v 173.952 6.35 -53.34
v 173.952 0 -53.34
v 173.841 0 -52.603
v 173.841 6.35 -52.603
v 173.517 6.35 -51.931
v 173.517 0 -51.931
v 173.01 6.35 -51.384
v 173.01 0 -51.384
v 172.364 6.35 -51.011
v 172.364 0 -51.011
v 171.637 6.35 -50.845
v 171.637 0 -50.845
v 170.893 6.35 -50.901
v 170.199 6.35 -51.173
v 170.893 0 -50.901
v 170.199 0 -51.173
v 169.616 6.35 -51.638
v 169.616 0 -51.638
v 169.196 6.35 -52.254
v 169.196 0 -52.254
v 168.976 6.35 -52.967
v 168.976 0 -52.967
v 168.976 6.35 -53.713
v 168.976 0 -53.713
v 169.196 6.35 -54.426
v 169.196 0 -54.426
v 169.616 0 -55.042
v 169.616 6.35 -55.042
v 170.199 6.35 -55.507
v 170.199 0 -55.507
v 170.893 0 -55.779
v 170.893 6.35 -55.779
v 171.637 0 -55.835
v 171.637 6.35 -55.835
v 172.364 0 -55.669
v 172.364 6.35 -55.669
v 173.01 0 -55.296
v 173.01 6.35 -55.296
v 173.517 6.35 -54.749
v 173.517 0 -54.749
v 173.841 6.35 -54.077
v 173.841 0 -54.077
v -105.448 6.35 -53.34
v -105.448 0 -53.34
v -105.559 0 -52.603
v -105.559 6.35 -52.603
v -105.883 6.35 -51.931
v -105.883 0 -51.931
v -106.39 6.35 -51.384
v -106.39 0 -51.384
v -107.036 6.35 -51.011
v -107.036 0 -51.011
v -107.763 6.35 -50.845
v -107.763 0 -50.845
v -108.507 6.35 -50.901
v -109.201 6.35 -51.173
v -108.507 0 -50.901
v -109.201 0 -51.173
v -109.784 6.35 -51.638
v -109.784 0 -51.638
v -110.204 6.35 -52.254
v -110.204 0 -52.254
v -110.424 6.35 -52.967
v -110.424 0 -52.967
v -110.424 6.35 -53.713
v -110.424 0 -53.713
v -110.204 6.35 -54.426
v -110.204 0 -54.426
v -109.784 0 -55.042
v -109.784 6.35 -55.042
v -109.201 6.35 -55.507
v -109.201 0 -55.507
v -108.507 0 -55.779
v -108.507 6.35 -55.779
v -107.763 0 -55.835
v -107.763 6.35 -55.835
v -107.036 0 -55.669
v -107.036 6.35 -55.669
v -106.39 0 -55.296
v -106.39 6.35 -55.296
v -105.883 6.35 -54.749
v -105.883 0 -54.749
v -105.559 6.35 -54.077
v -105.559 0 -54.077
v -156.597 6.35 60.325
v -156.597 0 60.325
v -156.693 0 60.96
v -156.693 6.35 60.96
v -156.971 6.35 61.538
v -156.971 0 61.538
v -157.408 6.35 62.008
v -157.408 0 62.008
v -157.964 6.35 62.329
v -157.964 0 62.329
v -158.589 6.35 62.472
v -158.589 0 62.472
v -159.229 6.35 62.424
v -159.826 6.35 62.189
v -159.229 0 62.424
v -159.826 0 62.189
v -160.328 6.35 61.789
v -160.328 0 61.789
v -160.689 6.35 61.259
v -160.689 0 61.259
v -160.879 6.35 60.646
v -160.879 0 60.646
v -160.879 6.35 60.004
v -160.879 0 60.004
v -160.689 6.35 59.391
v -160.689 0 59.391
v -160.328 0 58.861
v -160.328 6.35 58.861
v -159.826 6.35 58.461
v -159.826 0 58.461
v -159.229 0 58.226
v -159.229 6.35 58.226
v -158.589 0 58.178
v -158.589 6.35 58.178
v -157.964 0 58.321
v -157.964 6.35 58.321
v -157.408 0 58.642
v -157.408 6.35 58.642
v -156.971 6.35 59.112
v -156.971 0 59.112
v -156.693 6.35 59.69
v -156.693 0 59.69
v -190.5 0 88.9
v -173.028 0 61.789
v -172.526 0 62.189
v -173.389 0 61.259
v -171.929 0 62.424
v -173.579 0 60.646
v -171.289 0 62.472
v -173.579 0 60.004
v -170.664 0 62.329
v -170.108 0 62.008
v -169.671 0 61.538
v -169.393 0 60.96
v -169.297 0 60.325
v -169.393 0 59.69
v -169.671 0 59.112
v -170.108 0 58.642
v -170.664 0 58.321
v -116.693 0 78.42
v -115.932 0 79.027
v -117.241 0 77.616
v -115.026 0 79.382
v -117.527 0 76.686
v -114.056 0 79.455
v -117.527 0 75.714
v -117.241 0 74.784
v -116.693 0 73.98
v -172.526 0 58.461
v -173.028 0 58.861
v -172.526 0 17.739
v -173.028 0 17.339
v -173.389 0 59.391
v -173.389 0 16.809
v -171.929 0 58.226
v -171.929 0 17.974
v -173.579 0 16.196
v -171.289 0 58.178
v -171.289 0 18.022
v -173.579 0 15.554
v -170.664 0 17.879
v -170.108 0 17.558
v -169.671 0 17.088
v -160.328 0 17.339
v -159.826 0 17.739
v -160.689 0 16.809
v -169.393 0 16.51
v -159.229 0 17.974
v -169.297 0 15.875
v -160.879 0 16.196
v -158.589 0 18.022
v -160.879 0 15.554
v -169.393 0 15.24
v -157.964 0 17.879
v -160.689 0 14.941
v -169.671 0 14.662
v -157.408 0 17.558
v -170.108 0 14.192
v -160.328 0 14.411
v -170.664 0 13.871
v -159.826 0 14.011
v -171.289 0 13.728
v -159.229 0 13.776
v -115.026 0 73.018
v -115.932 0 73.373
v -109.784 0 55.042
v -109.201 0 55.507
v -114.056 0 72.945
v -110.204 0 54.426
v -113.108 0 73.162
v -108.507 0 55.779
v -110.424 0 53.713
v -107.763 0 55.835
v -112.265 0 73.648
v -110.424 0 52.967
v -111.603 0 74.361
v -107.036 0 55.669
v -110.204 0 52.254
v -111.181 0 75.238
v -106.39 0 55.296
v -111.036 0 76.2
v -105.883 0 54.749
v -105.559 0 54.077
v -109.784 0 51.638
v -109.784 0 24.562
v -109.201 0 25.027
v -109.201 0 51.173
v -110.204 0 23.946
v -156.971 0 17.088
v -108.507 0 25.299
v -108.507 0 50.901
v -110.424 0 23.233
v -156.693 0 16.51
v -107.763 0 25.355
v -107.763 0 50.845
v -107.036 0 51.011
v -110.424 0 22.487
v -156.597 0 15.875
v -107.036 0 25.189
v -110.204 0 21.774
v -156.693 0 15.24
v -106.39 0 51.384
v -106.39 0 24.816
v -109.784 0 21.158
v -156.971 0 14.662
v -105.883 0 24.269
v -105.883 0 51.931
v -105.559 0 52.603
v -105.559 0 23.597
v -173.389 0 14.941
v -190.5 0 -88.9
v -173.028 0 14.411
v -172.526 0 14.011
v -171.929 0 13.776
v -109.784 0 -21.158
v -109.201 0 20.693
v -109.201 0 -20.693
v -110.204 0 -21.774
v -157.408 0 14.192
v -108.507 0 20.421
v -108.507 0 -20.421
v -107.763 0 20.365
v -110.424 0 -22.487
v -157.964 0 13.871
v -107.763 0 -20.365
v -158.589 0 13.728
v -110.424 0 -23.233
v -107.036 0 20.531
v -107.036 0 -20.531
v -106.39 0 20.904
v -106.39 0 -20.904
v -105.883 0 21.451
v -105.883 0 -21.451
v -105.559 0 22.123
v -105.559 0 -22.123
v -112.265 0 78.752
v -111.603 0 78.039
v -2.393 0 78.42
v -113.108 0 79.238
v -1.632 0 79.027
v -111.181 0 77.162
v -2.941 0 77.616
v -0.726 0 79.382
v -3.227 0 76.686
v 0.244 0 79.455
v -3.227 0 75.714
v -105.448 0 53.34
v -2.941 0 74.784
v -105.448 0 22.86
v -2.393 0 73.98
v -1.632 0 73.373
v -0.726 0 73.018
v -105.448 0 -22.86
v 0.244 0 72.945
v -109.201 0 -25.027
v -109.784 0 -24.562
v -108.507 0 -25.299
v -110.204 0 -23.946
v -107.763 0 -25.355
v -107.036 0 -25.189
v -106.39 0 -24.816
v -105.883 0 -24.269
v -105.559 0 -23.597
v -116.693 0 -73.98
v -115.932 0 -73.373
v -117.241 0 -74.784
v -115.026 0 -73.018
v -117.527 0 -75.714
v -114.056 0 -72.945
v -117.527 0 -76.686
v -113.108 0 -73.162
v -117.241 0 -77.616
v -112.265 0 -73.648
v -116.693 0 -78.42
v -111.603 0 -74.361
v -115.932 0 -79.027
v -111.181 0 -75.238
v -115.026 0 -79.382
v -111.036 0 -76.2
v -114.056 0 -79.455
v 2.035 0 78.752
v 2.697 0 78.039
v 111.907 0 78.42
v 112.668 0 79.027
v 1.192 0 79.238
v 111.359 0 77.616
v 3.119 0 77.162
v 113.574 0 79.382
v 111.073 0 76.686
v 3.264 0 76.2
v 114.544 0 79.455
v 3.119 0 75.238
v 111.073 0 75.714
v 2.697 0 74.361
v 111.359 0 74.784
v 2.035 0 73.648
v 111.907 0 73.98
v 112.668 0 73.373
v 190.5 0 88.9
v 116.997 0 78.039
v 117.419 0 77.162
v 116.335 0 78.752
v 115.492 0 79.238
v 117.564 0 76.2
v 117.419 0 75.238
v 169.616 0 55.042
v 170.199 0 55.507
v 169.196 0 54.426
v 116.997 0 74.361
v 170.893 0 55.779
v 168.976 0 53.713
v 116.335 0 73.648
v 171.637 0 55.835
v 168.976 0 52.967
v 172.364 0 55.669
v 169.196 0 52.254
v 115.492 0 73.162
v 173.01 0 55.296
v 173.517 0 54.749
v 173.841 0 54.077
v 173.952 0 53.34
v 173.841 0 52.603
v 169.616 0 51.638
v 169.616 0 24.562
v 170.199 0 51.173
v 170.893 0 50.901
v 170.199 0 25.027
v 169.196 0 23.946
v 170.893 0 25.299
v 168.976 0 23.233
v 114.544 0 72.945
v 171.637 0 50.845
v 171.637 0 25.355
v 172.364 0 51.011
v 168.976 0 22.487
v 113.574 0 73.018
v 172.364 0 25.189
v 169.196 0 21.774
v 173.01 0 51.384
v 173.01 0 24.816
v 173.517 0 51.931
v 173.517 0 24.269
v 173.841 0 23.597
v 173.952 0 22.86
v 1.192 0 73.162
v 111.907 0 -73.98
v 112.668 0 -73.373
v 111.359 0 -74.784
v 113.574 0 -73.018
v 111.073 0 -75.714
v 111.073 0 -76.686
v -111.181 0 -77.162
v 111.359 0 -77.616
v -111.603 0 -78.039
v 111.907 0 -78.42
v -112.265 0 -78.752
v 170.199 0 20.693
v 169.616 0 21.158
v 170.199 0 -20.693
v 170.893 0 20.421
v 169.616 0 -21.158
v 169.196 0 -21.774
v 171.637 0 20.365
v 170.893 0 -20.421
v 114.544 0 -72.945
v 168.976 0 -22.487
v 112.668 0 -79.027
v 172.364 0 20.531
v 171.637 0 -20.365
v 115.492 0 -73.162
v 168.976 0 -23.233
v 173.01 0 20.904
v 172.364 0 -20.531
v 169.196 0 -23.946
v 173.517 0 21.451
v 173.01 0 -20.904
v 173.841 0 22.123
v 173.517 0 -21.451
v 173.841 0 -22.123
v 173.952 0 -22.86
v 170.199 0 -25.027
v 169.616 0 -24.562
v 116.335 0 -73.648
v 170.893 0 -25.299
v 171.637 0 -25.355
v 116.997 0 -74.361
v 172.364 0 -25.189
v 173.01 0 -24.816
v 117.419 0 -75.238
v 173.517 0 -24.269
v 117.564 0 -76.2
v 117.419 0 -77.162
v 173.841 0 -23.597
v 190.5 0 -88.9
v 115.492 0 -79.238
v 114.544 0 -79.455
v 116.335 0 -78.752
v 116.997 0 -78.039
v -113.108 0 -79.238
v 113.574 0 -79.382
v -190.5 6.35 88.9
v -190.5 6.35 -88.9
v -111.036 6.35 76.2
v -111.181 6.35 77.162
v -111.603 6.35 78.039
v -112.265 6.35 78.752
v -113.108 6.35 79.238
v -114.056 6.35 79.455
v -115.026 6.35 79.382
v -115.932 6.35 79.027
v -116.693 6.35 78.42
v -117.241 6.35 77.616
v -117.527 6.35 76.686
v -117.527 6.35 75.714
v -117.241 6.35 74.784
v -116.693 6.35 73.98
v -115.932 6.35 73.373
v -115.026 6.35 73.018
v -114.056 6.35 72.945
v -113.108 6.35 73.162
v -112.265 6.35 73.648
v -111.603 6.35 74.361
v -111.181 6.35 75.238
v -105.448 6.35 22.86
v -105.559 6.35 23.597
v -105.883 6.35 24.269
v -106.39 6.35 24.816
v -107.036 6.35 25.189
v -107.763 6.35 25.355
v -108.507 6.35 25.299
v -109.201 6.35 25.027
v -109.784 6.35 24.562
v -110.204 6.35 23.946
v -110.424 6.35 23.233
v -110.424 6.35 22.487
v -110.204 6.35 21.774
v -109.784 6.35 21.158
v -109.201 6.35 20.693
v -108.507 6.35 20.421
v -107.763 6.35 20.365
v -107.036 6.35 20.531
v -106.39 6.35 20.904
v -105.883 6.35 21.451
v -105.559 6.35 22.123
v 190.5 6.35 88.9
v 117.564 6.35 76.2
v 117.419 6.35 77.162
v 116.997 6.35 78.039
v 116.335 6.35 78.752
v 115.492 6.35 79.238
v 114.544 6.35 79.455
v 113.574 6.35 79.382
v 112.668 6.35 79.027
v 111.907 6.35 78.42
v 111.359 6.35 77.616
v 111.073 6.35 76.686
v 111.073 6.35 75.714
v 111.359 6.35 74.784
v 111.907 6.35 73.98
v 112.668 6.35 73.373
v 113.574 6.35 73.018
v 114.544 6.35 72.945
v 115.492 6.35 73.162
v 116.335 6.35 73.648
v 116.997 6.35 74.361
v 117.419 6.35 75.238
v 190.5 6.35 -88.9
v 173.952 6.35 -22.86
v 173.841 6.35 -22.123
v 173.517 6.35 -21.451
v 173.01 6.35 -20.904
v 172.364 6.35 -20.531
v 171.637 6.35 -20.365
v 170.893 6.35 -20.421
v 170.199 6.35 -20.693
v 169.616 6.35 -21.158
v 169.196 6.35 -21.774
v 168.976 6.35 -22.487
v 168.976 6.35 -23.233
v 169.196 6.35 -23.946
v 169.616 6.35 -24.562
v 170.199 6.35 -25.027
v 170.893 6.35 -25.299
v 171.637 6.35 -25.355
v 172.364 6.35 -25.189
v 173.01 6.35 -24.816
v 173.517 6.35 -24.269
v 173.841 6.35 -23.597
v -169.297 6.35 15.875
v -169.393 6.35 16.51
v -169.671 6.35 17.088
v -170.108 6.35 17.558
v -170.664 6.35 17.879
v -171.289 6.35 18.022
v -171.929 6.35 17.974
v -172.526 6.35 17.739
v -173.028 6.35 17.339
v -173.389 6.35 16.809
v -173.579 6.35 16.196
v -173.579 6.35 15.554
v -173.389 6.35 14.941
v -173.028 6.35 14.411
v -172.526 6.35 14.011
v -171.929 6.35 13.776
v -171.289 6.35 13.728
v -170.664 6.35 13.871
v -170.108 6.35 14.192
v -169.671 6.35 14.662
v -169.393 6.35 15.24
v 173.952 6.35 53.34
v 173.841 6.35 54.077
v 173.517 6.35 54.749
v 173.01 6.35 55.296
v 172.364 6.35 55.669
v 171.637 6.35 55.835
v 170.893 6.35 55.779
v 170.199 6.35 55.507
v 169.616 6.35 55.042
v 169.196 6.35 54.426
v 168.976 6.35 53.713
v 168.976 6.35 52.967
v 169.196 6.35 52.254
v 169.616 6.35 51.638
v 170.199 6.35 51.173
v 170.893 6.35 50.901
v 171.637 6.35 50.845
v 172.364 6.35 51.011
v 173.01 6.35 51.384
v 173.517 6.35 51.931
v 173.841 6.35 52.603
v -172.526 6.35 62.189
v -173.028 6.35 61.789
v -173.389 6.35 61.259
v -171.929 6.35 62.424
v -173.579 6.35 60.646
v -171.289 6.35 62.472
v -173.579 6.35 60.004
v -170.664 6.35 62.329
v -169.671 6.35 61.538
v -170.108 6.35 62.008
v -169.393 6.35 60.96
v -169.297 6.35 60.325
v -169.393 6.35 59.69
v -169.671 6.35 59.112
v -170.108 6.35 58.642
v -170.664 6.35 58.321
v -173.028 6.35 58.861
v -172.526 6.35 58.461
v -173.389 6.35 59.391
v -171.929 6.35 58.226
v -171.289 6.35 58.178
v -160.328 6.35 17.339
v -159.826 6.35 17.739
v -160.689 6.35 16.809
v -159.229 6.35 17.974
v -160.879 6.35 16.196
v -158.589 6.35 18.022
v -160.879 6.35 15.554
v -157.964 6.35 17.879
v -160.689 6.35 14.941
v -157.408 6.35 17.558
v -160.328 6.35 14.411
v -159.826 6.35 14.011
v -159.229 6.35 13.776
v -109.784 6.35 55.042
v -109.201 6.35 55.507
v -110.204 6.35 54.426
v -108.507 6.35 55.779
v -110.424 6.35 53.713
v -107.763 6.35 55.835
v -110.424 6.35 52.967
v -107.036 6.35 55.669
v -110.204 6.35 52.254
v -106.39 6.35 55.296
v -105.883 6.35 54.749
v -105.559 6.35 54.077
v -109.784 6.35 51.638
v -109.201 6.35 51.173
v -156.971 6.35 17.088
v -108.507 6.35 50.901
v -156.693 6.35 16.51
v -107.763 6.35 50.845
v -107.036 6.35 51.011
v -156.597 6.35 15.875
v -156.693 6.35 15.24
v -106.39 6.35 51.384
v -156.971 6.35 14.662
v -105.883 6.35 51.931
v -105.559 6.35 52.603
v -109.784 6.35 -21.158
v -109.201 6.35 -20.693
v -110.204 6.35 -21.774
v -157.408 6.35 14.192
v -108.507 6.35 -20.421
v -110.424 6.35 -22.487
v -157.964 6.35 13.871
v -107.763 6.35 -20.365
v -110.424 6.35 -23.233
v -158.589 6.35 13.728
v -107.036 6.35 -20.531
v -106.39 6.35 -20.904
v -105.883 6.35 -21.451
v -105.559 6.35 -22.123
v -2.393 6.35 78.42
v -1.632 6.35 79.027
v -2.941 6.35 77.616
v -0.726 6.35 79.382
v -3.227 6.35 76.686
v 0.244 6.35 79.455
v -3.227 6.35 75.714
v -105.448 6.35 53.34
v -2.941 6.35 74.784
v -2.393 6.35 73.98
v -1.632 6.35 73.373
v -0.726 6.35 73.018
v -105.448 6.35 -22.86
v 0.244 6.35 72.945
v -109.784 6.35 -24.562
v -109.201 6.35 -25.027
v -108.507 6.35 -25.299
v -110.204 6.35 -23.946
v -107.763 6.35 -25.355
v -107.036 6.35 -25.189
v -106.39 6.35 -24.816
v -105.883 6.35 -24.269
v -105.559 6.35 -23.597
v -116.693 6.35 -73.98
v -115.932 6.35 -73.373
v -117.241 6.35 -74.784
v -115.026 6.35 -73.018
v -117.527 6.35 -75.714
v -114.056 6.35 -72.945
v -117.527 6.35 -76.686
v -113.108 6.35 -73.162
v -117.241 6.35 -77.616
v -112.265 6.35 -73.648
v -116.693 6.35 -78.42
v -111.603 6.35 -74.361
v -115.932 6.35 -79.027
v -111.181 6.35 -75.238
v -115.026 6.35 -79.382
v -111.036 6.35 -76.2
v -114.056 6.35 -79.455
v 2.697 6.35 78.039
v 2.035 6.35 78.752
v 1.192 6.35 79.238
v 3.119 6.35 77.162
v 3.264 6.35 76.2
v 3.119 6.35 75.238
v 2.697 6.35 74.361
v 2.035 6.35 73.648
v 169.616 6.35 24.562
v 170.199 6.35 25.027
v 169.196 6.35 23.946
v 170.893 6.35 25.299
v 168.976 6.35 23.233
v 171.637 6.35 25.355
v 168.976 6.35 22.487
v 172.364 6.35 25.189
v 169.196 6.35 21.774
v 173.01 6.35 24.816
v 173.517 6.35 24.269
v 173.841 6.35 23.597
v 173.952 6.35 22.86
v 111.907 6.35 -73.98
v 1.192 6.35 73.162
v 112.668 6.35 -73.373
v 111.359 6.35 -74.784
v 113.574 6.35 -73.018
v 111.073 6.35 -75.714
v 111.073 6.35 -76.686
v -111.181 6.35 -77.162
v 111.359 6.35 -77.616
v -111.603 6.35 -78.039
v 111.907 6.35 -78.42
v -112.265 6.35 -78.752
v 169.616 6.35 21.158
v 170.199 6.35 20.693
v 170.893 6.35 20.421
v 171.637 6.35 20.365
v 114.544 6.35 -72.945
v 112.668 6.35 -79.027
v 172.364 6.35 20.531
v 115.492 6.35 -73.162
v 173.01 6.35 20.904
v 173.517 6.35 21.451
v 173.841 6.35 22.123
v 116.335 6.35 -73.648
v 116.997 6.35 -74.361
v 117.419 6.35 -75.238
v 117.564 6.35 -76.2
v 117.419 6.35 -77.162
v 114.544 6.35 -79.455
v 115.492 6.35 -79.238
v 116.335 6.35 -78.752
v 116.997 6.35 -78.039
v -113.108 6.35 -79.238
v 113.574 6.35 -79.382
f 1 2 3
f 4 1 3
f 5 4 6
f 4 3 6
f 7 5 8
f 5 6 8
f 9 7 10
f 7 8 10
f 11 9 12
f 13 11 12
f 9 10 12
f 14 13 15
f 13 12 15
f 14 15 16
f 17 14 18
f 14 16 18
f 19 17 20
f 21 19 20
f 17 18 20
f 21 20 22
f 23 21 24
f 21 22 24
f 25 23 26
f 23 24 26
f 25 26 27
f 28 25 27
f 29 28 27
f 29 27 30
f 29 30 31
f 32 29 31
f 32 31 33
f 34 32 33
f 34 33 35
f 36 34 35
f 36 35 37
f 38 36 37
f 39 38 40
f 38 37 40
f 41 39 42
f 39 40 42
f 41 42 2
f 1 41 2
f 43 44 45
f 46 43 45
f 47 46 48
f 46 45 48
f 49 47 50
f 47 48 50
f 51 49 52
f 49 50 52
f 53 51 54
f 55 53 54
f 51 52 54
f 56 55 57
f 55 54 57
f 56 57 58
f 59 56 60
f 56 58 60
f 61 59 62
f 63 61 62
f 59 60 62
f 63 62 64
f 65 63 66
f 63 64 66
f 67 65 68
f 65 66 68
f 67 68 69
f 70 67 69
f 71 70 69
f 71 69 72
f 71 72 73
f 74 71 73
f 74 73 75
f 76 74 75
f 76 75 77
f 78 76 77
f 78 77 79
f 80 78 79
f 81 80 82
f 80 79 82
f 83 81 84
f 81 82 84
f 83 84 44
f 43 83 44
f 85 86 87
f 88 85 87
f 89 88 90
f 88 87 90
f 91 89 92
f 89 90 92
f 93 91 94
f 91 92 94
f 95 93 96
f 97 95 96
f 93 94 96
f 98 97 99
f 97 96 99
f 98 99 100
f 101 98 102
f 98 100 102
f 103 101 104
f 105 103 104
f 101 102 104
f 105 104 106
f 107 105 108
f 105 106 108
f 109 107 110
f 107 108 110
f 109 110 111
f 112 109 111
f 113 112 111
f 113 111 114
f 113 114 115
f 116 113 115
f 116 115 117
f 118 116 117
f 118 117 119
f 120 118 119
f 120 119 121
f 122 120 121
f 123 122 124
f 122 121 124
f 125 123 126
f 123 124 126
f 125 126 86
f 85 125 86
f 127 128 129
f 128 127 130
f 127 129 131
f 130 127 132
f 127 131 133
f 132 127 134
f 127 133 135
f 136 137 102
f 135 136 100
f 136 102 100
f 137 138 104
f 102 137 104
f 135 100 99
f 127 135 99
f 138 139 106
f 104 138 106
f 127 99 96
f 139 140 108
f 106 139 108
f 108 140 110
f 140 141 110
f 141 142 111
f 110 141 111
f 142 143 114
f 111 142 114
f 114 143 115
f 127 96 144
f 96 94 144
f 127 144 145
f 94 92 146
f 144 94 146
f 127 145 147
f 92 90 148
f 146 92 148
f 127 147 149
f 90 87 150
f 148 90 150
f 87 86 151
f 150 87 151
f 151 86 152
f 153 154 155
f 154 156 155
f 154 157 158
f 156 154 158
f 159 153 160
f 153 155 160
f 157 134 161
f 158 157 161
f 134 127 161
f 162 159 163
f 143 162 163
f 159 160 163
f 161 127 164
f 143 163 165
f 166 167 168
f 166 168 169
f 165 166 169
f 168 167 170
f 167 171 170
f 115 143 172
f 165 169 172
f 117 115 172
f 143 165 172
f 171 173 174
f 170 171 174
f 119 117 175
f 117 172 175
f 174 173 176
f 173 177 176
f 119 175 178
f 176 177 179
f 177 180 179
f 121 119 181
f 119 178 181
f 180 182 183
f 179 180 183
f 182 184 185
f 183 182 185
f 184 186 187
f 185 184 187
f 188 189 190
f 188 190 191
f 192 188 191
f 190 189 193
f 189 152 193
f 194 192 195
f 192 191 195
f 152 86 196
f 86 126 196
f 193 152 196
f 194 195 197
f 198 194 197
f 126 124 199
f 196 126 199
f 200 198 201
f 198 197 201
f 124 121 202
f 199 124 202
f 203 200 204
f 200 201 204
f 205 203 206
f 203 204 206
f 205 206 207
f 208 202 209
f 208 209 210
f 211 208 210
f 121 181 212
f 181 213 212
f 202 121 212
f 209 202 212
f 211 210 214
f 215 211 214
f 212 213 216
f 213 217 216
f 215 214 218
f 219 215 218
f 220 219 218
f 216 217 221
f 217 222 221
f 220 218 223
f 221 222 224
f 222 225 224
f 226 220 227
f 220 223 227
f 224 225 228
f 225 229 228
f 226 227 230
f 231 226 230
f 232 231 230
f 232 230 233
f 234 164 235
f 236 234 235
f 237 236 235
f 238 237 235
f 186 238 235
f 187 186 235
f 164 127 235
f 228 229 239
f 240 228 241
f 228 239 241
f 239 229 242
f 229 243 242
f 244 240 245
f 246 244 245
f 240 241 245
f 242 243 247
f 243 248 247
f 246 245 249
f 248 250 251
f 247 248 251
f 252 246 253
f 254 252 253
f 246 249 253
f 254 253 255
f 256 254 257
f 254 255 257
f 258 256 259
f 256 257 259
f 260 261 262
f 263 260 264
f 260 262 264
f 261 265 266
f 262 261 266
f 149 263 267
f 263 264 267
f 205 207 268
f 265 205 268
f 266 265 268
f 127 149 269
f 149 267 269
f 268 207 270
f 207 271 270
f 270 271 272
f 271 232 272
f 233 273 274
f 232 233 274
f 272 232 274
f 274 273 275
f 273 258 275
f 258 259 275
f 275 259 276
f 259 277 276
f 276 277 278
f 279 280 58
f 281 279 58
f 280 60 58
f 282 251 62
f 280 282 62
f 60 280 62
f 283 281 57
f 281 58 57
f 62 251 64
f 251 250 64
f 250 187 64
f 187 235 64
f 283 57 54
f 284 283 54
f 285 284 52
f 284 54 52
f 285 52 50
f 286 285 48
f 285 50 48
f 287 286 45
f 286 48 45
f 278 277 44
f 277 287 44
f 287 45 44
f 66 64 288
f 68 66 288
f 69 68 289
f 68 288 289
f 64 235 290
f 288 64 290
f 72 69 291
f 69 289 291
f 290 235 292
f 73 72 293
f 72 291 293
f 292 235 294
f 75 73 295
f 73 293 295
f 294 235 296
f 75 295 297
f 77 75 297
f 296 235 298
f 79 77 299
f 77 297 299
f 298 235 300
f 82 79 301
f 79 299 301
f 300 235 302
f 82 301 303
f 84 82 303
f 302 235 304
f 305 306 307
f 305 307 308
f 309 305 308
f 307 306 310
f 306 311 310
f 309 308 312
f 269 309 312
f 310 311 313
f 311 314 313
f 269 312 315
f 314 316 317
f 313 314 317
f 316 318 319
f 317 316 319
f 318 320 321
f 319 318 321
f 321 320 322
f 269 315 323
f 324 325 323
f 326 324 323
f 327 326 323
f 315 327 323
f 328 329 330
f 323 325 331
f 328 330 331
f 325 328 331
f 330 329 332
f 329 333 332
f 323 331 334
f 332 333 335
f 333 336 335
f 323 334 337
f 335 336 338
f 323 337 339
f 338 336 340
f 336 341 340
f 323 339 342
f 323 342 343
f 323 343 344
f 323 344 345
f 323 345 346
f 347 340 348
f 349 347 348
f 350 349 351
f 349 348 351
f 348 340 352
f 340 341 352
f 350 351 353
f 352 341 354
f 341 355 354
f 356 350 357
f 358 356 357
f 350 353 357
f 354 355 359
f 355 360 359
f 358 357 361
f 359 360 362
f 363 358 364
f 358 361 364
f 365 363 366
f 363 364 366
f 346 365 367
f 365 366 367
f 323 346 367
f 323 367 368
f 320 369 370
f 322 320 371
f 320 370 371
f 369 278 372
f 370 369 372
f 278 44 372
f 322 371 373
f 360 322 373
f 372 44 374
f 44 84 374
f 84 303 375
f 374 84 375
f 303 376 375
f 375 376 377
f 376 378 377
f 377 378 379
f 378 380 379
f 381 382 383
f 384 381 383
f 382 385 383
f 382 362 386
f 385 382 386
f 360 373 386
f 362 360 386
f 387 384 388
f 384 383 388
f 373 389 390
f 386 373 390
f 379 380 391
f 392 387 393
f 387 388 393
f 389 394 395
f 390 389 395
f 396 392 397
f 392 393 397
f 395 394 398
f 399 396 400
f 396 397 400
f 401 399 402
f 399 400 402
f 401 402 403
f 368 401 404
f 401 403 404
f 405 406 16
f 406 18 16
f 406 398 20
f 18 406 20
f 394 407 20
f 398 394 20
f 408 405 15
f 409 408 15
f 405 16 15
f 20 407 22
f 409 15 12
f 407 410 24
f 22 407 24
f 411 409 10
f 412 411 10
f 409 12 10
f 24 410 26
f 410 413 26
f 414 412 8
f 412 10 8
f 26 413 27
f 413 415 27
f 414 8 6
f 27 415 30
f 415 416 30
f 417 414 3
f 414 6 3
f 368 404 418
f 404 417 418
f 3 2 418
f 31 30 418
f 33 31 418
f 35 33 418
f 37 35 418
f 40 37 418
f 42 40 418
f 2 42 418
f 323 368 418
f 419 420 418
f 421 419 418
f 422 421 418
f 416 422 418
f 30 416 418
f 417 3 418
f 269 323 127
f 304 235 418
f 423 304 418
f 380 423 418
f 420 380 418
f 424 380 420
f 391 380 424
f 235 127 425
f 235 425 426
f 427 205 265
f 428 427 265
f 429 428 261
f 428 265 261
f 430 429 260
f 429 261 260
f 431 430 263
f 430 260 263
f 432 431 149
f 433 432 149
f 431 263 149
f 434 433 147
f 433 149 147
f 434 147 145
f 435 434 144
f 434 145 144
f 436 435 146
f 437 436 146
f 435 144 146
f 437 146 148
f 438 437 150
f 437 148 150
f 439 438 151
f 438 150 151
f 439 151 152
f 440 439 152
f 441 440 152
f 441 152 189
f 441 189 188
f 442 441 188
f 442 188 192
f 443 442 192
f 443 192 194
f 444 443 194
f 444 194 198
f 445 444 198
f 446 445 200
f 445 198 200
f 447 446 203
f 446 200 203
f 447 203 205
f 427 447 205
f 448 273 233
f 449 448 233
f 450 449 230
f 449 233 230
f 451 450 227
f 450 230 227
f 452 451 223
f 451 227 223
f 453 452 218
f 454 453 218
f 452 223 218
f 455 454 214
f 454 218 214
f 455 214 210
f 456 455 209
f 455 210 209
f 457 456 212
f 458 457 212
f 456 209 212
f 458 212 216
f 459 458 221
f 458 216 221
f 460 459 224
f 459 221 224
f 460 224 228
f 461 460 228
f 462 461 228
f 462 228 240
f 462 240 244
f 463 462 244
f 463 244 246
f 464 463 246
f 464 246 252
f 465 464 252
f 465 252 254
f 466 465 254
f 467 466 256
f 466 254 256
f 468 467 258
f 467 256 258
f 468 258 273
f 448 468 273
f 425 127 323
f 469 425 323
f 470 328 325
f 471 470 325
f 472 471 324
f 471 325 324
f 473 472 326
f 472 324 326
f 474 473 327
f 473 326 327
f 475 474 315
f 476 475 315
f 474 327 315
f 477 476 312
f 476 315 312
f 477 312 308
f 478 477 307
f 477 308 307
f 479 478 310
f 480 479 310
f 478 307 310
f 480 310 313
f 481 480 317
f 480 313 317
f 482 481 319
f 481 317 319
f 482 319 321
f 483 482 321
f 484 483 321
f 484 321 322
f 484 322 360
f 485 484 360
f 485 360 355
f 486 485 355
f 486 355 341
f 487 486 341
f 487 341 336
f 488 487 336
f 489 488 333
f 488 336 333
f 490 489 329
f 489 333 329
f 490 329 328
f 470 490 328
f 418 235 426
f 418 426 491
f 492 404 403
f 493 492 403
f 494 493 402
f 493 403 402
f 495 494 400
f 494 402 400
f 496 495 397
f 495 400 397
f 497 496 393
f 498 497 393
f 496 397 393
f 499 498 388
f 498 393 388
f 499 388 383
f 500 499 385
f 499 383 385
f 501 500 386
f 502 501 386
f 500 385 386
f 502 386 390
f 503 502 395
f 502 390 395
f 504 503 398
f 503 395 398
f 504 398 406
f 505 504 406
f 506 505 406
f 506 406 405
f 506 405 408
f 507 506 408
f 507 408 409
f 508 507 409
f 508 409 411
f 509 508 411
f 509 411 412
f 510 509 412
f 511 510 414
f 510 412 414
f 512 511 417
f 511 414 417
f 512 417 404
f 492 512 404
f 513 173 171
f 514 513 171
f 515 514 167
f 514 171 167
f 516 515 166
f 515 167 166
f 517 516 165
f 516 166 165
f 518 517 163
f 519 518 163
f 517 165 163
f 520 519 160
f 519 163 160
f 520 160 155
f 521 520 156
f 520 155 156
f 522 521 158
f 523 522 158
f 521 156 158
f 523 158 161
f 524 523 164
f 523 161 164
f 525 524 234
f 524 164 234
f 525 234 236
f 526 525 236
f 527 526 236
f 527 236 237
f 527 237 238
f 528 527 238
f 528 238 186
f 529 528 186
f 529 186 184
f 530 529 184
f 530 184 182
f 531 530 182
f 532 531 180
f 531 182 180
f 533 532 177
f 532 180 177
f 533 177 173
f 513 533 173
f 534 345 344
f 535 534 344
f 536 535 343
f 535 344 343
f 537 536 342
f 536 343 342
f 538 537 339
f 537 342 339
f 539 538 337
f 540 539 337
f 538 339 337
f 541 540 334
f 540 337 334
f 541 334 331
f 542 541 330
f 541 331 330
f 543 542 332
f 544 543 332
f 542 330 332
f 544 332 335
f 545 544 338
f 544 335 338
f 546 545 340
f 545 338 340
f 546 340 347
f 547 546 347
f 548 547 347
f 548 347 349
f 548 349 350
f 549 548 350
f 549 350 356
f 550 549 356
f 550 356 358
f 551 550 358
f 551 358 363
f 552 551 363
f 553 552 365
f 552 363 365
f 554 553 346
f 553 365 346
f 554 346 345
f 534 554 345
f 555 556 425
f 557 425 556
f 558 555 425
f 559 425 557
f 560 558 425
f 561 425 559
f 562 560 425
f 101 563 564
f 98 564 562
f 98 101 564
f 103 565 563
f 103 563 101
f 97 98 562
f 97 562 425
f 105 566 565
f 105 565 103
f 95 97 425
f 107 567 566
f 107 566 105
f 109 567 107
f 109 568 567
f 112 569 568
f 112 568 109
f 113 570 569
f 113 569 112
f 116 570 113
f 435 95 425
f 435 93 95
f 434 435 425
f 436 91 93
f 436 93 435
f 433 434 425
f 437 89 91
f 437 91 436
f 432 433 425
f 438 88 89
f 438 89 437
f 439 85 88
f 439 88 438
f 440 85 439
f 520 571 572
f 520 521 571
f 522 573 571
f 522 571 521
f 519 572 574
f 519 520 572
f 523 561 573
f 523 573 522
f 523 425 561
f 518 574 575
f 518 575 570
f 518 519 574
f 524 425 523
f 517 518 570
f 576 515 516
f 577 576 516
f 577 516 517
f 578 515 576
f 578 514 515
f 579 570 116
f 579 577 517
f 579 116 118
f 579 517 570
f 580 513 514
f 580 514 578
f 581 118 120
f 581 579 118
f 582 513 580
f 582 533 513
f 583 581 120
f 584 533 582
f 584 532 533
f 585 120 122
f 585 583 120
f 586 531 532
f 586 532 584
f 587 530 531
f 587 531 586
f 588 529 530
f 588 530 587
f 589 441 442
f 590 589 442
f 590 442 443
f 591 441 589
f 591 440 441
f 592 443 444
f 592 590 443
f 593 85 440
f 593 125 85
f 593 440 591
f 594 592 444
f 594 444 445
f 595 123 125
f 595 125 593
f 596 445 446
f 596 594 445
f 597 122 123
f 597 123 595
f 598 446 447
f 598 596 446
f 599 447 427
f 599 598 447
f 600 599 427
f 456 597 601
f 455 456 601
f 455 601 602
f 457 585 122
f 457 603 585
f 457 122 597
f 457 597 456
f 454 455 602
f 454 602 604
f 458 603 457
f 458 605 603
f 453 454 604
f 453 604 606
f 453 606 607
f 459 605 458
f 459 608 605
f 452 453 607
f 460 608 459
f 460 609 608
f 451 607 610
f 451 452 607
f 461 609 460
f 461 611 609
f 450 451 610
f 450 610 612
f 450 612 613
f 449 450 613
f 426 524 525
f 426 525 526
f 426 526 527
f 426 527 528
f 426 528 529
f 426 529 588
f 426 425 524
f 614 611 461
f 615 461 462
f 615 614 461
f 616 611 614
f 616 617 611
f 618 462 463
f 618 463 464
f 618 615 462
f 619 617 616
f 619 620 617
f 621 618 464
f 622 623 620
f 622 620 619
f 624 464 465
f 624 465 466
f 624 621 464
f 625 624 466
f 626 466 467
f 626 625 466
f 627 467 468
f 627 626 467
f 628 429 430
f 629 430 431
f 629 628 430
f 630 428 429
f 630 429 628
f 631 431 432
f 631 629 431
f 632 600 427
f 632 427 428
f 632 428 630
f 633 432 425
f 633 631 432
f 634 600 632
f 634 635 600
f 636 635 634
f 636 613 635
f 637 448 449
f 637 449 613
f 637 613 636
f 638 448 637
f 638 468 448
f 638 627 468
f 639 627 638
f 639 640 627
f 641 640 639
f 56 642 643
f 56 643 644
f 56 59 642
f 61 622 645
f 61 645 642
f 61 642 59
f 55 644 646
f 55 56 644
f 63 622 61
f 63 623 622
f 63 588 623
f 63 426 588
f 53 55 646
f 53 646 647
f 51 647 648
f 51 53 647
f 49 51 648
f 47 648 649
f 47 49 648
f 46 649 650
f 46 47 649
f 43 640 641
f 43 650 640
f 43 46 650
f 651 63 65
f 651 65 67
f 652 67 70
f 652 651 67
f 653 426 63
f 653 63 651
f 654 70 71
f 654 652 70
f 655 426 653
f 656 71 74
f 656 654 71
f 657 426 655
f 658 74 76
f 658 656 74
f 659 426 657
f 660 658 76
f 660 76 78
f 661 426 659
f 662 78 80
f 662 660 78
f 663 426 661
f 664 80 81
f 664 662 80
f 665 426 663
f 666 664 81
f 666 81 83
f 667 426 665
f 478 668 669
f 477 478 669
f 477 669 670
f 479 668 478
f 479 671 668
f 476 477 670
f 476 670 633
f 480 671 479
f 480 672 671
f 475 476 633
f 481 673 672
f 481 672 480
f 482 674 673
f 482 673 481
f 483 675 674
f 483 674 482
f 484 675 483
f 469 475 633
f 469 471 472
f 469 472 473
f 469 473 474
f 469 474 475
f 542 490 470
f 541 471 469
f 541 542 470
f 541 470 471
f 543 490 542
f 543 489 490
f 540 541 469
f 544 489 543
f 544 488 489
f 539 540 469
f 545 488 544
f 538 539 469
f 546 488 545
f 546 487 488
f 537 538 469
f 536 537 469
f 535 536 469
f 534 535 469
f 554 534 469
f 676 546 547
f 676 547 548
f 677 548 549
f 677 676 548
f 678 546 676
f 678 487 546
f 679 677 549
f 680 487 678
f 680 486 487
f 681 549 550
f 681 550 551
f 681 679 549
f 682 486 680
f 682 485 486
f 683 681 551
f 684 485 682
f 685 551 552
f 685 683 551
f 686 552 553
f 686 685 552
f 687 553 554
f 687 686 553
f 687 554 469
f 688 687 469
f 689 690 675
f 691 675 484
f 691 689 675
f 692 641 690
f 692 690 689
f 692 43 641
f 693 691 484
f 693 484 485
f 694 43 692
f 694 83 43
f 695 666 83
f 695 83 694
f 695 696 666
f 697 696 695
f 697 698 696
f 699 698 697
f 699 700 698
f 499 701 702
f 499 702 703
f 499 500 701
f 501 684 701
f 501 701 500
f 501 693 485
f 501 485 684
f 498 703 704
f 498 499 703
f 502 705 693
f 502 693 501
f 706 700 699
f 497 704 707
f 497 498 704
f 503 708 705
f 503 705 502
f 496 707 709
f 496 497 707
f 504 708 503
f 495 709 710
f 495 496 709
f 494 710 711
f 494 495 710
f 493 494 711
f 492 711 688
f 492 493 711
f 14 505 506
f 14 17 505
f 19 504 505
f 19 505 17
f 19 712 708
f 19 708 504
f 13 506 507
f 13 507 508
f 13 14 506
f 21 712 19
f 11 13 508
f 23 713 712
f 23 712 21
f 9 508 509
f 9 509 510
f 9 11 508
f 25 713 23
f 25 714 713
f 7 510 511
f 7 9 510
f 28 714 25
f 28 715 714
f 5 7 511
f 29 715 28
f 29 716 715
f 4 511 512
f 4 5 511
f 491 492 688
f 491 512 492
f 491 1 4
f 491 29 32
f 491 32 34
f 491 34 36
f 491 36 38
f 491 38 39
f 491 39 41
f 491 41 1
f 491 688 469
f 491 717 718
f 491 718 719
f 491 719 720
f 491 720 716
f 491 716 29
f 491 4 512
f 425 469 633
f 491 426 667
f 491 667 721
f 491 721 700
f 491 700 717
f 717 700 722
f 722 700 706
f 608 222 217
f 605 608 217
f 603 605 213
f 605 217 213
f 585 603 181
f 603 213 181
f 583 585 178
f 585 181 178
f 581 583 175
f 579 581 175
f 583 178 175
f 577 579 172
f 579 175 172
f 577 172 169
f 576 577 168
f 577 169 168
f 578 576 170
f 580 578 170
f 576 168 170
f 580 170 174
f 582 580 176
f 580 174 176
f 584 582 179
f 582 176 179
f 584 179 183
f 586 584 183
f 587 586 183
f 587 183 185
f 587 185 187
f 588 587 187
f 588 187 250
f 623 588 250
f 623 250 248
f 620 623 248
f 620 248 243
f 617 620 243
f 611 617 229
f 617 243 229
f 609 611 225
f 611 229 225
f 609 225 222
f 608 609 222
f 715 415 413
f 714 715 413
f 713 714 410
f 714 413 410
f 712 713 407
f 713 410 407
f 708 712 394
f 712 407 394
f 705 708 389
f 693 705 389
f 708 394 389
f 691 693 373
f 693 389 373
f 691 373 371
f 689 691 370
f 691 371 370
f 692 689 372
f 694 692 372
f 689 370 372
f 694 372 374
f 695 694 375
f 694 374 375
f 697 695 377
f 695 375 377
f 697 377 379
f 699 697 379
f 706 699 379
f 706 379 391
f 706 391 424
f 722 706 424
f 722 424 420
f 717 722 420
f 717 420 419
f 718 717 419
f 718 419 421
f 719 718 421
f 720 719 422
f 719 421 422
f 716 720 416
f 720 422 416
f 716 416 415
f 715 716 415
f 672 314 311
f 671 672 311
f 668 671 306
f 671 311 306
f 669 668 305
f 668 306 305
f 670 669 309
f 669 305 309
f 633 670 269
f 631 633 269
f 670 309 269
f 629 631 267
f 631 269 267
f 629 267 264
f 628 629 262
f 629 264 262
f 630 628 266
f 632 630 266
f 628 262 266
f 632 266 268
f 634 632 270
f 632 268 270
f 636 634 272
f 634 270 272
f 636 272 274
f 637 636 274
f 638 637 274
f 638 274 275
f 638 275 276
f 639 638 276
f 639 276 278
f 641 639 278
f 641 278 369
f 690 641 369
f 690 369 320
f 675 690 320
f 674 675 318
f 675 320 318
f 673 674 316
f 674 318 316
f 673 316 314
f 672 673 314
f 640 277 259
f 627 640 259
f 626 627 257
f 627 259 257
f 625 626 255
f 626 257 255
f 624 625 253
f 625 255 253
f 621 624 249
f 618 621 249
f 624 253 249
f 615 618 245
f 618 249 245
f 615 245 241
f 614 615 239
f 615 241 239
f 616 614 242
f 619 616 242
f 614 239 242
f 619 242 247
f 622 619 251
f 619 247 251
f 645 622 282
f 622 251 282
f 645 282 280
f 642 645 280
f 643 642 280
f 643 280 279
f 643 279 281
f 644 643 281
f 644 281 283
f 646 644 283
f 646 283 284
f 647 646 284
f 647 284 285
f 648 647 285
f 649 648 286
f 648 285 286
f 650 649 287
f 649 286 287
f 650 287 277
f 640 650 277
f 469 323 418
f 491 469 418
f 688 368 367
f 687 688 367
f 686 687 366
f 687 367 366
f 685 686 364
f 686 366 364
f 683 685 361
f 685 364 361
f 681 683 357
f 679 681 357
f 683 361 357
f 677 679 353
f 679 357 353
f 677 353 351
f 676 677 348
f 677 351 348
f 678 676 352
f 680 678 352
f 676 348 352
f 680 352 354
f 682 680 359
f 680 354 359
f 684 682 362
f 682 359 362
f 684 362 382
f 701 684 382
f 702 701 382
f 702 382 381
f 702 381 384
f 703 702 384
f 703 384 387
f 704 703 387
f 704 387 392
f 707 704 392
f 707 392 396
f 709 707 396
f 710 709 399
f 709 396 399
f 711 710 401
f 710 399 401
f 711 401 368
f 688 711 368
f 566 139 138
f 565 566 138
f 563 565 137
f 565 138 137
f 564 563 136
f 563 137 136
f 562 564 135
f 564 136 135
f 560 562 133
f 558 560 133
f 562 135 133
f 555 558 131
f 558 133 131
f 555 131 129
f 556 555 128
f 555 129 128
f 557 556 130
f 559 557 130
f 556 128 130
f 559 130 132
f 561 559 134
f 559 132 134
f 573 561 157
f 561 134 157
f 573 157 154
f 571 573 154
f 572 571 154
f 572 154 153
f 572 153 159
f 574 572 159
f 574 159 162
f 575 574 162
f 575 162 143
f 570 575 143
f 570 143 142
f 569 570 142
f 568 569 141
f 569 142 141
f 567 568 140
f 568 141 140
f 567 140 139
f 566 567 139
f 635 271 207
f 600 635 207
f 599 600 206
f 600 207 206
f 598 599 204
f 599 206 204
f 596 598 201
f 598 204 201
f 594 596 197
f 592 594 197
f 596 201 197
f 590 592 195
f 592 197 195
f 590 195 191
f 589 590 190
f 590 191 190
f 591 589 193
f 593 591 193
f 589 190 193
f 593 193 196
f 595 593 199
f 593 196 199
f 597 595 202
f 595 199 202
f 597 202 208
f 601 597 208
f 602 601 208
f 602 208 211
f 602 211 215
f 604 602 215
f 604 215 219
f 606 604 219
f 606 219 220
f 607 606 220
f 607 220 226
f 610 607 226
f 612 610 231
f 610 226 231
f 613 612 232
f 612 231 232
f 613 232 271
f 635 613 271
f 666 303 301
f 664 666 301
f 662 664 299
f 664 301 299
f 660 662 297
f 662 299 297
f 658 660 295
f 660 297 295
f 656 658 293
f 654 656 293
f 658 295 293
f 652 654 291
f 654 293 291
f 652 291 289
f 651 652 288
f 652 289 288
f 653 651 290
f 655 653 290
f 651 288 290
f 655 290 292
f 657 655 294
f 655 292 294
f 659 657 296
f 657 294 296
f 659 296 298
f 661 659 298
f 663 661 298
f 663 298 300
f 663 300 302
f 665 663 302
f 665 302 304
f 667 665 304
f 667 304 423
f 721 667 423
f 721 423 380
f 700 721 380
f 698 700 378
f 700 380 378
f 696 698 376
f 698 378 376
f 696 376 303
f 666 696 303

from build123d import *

# Parameters (mm, degrees)
SKETCH1_W                  = 381
SKETCH1_H                  = 177.8
PLATE_DEPTH                = 6.35
SKETCH4_R                  = 3.2639
CHASSISMOUNTINGHOLES_DEPTH = 6.35
SKETCH5_R                  = 2.5019
LEADSCREWGUIDEMOUNTS_DEPTH = 6.35
SKETCH6_R                  = 2.15265
LEADSCREWMOTORMOUNT_DEPTH  = 6.35


with BuildPart() as part:
    # Sketch1 → Plate (new body)
    with BuildSketch(Plane(origin=(0, 0, 0), x_dir=(1, 0, 0), z_dir=(0, 1, 0))):
        Rectangle(SKETCH1_W, SKETCH1_H)
    extrude(amount=PLATE_DEPTH)

    # Sketch4 → ChassisMountingHoles (cut)
    with BuildSketch(Plane.XZ):
        with Locations((0, 76.2)):
            Circle(SKETCH4_R)
        with Locations((-114.3, 76.2)):
            Circle(SKETCH4_R)
        with Locations((114.3, 76.2)):
            Circle(SKETCH4_R)
        with Locations((-114.3, -76.2)):
            Circle(SKETCH4_R)
        with Locations((114.3, -76.2)):
            Circle(SKETCH4_R)
    extrude(amount=-CHASSISMOUNTINGHOLES_DEPTH, mode=Mode.SUBTRACT)

    # Sketch5 → LeadScrewGuideMounts (cut)
    with BuildSketch(Plane.XZ):
        with Locations((171.45, 53.34)):
            Circle(SKETCH5_R)
        with Locations((171.45, 22.86)):
            Circle(SKETCH5_R)
        with Locations((-107.95, 53.34)):
            Circle(SKETCH5_R)
        with Locations((-107.95, 22.86)):
            Circle(SKETCH5_R)
        with Locations((171.45, -53.34)):
            Circle(SKETCH5_R)
        with Locations((171.45, -22.86)):
            Circle(SKETCH5_R)
        with Locations((-107.95, -22.86)):
            Circle(SKETCH5_R)
        with Locations((-107.95, -53.34)):
            Circle(SKETCH5_R)
    extrude(amount=-LEADSCREWGUIDEMOUNTS_DEPTH, mode=Mode.SUBTRACT)

    # Sketch6 → LeadScrewMotorMount (cut)
    with BuildSketch(Plane.XZ):
        with Locations((-171.45, 60.325)):
            Circle(SKETCH6_R)
        with Locations((-158.75, 60.325)):
            Circle(SKETCH6_R)
        with Locations((-171.45, 15.875)):
            Circle(SKETCH6_R)
        with Locations((-158.75, 15.875)):
            Circle(SKETCH6_R)
    extrude(amount=-LEADSCREWMOTORMOUNT_DEPTH, mode=Mode.SUBTRACT)


solid = part.part
